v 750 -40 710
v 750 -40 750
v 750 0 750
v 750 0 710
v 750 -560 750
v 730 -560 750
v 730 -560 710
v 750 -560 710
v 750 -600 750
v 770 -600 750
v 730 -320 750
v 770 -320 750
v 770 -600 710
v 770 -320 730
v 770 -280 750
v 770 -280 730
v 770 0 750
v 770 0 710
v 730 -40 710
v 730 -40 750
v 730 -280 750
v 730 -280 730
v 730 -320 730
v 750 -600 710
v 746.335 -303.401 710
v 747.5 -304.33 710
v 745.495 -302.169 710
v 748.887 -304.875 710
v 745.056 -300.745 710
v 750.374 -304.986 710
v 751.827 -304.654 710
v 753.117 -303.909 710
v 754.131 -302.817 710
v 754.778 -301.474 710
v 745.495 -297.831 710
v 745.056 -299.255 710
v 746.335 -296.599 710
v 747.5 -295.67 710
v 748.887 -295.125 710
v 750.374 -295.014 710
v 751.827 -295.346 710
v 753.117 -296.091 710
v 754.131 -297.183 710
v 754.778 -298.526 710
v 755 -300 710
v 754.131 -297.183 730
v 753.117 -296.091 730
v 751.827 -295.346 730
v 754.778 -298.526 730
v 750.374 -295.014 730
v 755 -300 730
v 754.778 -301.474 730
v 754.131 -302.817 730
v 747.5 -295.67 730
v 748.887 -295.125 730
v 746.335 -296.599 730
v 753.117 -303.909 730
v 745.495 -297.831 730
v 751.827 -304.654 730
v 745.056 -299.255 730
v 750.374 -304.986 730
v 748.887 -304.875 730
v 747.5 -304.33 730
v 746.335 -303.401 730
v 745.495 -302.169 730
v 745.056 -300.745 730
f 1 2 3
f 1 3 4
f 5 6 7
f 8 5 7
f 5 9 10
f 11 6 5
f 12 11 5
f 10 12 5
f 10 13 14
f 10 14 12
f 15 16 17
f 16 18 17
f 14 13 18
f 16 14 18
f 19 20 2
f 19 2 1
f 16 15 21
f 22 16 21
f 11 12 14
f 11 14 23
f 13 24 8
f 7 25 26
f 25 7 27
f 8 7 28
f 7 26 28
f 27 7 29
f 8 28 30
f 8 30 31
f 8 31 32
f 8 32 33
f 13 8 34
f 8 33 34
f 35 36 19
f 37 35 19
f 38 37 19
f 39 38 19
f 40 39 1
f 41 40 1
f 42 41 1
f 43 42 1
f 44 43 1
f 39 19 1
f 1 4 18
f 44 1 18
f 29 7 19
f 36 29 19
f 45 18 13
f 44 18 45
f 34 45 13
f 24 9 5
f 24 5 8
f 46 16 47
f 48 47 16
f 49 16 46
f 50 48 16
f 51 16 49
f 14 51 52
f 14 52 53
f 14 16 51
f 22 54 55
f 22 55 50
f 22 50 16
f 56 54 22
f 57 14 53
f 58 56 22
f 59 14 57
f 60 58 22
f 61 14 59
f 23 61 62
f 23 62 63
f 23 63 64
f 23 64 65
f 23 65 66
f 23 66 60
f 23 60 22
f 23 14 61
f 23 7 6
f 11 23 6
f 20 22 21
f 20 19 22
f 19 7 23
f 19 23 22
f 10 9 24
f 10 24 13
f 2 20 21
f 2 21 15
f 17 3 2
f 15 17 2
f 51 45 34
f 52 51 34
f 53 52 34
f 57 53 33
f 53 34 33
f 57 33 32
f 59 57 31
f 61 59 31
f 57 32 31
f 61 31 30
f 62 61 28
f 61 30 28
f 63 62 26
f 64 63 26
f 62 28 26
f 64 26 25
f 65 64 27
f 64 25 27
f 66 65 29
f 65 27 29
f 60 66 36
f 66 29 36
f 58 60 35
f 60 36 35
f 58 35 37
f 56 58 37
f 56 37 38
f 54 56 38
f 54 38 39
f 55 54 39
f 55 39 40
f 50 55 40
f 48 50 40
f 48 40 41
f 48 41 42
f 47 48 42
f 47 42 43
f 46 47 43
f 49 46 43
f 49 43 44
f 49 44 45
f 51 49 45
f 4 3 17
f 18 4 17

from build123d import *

# Parameters (mm, degrees)
SKETCH018_W     = 40
SKETCH018_H     = 40
PAD018_DEPTH    = 600
SKETCH019_W     = 40
SKETCH019_H     = 40
POCKET_DEPTH    = 20
SKETCH020_W     = 40
SKETCH020_H     = 40
POCKET001_DEPTH = 20
SKETCH064_R     = 5
POCKET019_DEPTH = 40.001


with BuildPart() as part:
    # Sketch018 → Pad018 (new body)
    with BuildSketch(Plane.XZ):
        with Locations((20, 280)):
            Rectangle(SKETCH018_W, SKETCH018_H)
    extrude(amount=PAD018_DEPTH)

    # Sketch019 (on Face4 of Pad018) → Pocket (cut)
    with BuildSketch(Plane(origin=(0, 0, 0), x_dir=(0, 0, -1), z_dir=(-1, 0, 0))):
        with Locations((-280, 580)):
            Rectangle(SKETCH019_W, SKETCH019_H)
        with Locations((-280, 20)):
            Rectangle(SKETCH019_W, SKETCH019_H)
    extrude(amount=-POCKET_DEPTH, mode=Mode.SUBTRACT)

    # Sketch020 (on Face1 of Pocket) → Pocket001 (cut)
    with BuildSketch(Plane(origin=(0, 0, 300), x_dir=(-1, 0, 0), z_dir=(0, 0, 1))):
        with Locations((-20, 300)):
            Rectangle(SKETCH020_W, SKETCH020_H)
    extrude(amount=-POCKET001_DEPTH, mode=Mode.SUBTRACT)

    # Sketch064 (on Face8 of Pocket001) → Pocket019 (cut, through all)
    with BuildSketch(Plane(origin=(0, 0, 260), x_dir=(1, 0, 0), z_dir=(0, 0, -1))):
        with Locations((20, 300)):
            Circle(SKETCH064_R)
    extrude(amount=-POCKET019_DEPTH, mode=Mode.SUBTRACT)


with BuildPart() as part_1:
    # Clone008 placement: moved
    add(part.part.moved(Location((730, 0, 0))))


with BuildPart() as part_2:
    # Clone012 placement: moved
    add(part_1.part.moved(Location((0, 0, 450))))


solid = part_2.part
